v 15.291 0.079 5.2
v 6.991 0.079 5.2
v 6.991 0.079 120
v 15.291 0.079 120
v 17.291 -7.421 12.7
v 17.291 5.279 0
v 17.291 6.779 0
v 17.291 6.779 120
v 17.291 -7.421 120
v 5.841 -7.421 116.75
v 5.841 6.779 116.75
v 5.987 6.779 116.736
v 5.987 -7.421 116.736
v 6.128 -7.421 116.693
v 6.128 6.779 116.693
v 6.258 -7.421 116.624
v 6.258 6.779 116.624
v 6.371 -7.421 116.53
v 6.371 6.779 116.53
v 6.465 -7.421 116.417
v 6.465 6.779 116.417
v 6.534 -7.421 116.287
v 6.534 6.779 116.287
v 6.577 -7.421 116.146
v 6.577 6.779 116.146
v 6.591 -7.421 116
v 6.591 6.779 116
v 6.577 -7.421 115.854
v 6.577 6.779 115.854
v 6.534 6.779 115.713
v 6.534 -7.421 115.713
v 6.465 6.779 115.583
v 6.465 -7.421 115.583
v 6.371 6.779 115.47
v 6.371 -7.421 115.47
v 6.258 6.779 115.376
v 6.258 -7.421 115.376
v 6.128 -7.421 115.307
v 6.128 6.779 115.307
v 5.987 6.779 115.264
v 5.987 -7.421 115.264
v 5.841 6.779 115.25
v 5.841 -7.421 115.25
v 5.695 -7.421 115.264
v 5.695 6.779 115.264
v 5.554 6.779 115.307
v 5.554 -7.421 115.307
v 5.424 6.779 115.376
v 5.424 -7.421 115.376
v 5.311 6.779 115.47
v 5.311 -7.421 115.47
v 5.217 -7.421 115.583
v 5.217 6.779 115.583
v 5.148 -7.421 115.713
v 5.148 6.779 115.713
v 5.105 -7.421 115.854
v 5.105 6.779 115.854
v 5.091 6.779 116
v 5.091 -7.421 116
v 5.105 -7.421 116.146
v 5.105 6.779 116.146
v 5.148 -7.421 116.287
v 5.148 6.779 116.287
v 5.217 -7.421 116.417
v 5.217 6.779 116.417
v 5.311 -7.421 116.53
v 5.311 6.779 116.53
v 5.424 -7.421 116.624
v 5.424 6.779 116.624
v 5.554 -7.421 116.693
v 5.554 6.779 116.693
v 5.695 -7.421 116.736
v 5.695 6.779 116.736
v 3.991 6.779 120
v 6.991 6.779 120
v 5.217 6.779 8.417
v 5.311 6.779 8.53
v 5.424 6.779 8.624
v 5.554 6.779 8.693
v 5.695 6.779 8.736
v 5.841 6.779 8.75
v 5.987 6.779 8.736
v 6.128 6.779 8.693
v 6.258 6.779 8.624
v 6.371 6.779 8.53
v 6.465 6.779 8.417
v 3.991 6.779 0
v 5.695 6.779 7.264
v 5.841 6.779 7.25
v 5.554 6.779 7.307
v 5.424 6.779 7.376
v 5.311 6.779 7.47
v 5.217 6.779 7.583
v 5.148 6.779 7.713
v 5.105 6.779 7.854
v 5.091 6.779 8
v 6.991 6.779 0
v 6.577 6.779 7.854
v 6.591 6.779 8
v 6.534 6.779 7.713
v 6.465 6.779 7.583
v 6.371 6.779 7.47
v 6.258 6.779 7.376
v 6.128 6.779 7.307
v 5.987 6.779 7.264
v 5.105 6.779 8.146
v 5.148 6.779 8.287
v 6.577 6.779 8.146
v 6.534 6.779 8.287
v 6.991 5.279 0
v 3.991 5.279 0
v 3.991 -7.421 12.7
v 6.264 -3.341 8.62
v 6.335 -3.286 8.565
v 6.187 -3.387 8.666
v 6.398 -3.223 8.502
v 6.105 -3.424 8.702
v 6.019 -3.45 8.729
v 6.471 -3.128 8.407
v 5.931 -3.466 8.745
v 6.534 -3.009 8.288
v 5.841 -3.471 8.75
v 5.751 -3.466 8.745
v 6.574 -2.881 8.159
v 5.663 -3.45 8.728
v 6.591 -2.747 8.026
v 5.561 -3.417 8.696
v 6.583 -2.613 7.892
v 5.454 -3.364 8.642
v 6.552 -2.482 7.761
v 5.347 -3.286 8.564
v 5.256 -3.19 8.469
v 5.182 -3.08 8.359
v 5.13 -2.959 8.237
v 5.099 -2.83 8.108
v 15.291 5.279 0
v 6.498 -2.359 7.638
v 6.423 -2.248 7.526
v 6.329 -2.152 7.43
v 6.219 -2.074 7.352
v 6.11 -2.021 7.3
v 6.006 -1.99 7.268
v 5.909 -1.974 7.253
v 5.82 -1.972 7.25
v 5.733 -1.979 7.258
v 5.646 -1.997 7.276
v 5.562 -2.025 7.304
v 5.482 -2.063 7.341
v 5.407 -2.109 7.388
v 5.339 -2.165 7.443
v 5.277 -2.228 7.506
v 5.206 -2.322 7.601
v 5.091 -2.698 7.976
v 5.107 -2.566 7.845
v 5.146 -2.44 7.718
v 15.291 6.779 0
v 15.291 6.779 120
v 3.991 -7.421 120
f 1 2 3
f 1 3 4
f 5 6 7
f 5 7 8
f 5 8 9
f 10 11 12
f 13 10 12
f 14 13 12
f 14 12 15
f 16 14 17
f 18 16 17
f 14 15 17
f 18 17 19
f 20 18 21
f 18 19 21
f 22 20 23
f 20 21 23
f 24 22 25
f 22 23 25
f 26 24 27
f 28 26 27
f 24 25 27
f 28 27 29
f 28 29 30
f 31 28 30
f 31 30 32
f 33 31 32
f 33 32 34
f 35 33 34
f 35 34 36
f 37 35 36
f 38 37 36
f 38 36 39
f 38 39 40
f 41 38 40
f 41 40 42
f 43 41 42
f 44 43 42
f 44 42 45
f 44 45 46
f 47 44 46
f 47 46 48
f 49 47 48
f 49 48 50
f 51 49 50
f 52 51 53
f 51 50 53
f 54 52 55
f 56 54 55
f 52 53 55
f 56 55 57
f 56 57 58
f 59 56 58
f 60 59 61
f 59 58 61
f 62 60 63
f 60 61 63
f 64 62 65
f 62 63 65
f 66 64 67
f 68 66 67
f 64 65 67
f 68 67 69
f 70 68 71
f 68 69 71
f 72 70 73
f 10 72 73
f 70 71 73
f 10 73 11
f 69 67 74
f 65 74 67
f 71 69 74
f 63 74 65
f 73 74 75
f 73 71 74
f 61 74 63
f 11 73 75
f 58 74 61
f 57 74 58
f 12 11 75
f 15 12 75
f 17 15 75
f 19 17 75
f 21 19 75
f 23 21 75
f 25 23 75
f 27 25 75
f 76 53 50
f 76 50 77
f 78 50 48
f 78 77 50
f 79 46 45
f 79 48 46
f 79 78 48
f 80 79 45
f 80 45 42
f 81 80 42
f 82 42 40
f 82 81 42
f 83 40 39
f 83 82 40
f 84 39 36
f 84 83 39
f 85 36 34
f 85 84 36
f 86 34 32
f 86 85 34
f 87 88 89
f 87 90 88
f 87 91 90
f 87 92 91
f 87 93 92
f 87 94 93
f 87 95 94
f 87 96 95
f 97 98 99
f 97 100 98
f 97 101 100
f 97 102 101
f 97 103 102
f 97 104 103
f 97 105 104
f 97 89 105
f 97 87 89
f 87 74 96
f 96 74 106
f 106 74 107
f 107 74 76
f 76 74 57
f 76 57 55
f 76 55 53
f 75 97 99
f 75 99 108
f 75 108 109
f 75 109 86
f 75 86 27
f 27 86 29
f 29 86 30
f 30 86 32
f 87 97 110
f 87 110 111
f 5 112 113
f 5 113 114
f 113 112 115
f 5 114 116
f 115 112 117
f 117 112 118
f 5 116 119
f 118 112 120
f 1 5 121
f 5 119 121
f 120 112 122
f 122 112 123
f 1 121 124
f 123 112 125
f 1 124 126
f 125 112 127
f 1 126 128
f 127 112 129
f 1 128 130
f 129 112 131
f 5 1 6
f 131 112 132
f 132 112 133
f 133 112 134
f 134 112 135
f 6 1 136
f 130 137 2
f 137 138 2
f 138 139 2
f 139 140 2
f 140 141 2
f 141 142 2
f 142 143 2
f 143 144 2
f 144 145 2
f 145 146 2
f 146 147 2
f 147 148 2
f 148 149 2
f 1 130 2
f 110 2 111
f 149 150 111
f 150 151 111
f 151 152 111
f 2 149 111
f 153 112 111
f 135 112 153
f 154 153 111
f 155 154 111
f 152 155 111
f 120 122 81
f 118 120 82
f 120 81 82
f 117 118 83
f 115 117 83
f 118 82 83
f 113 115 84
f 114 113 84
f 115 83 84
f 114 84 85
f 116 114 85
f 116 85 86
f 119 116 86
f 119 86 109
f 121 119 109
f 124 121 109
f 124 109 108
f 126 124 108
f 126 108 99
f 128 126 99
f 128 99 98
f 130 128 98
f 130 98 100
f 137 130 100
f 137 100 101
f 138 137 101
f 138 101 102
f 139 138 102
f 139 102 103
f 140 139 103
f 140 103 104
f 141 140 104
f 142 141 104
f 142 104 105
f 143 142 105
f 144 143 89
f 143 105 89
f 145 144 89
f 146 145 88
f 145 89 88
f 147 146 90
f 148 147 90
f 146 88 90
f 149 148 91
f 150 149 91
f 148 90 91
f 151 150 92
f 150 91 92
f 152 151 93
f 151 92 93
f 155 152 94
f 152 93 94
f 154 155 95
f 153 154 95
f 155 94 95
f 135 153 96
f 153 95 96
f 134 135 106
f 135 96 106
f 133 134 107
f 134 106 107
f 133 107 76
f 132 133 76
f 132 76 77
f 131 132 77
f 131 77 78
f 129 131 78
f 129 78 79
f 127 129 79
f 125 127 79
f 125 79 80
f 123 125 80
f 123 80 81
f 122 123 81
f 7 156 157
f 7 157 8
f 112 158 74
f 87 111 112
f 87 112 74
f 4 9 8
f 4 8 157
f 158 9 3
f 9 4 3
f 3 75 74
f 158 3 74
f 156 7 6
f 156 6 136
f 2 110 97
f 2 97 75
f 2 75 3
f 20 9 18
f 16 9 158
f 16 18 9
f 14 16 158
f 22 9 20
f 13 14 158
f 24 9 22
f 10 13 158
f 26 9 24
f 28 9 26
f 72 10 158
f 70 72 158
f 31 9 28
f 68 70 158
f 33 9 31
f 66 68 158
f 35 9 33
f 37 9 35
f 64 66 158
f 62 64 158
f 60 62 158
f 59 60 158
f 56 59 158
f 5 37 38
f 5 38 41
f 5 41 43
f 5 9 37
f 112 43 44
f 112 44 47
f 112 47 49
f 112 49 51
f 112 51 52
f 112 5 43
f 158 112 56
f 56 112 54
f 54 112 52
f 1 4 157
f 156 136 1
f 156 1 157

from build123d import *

# Parameters (mm, degrees)
RAIL_EXTRUDE_DEPTH = 120
SKETCH2_R          = 0.75
FIRST_HOLE_DEPTH   = 123.068100465
SKETCH3_R          = 0.75
LAST_HOLE_DEPTH    = 123.068100465
ANGLE_DEPTH        = 121.962670283


with BuildPart() as part:
    # Sketch1 → Rail-Extrude (new body)
    with BuildSketch(Plane.XY):
        Polygon((3.991071429, 6.778571429), (6.991071429, 6.778571429), (6.991071429, 0.078571429), (15.291071429, 0.078571429), (15.291071429, 6.778571429), (17.291071429, 6.778571429), (17.291071429, -7.421428571), (3.991071429, -7.421428571), align=None)
    extrude(amount=RAIL_EXTRUDE_DEPTH)

    # Sketch2 → First Hole (cut, through all)
    with BuildSketch(Plane(origin=(0, 6.778571429, 0), x_dir=(1, 0, 0), z_dir=(0, 1, 0))):
        with Locations((5.841071429, -8)):
            Circle(SKETCH2_R)
    extrude(amount=-FIRST_HOLE_DEPTH, mode=Mode.SUBTRACT)

    # Sketch3 → Last Hole (cut, through all)
    with BuildSketch(Plane(origin=(0, 6.778571429, 0), x_dir=(1, 0, 0), z_dir=(0, 1, 0))):
        with Locations((5.841071429, -116)):
            Circle(SKETCH3_R)
    extrude(amount=-LAST_HOLE_DEPTH, mode=Mode.SUBTRACT)

    # Sketch5 → Angle (cut, through all)
    with BuildSketch(Plane.ZY.offset(-3.991071429)):
        Polygon((12.7, -7.421428571), (0, 5.278571429), (0, -7.421428571), align=None)
    extrude(amount=-ANGLE_DEPTH, mode=Mode.SUBTRACT)


solid = part.part
